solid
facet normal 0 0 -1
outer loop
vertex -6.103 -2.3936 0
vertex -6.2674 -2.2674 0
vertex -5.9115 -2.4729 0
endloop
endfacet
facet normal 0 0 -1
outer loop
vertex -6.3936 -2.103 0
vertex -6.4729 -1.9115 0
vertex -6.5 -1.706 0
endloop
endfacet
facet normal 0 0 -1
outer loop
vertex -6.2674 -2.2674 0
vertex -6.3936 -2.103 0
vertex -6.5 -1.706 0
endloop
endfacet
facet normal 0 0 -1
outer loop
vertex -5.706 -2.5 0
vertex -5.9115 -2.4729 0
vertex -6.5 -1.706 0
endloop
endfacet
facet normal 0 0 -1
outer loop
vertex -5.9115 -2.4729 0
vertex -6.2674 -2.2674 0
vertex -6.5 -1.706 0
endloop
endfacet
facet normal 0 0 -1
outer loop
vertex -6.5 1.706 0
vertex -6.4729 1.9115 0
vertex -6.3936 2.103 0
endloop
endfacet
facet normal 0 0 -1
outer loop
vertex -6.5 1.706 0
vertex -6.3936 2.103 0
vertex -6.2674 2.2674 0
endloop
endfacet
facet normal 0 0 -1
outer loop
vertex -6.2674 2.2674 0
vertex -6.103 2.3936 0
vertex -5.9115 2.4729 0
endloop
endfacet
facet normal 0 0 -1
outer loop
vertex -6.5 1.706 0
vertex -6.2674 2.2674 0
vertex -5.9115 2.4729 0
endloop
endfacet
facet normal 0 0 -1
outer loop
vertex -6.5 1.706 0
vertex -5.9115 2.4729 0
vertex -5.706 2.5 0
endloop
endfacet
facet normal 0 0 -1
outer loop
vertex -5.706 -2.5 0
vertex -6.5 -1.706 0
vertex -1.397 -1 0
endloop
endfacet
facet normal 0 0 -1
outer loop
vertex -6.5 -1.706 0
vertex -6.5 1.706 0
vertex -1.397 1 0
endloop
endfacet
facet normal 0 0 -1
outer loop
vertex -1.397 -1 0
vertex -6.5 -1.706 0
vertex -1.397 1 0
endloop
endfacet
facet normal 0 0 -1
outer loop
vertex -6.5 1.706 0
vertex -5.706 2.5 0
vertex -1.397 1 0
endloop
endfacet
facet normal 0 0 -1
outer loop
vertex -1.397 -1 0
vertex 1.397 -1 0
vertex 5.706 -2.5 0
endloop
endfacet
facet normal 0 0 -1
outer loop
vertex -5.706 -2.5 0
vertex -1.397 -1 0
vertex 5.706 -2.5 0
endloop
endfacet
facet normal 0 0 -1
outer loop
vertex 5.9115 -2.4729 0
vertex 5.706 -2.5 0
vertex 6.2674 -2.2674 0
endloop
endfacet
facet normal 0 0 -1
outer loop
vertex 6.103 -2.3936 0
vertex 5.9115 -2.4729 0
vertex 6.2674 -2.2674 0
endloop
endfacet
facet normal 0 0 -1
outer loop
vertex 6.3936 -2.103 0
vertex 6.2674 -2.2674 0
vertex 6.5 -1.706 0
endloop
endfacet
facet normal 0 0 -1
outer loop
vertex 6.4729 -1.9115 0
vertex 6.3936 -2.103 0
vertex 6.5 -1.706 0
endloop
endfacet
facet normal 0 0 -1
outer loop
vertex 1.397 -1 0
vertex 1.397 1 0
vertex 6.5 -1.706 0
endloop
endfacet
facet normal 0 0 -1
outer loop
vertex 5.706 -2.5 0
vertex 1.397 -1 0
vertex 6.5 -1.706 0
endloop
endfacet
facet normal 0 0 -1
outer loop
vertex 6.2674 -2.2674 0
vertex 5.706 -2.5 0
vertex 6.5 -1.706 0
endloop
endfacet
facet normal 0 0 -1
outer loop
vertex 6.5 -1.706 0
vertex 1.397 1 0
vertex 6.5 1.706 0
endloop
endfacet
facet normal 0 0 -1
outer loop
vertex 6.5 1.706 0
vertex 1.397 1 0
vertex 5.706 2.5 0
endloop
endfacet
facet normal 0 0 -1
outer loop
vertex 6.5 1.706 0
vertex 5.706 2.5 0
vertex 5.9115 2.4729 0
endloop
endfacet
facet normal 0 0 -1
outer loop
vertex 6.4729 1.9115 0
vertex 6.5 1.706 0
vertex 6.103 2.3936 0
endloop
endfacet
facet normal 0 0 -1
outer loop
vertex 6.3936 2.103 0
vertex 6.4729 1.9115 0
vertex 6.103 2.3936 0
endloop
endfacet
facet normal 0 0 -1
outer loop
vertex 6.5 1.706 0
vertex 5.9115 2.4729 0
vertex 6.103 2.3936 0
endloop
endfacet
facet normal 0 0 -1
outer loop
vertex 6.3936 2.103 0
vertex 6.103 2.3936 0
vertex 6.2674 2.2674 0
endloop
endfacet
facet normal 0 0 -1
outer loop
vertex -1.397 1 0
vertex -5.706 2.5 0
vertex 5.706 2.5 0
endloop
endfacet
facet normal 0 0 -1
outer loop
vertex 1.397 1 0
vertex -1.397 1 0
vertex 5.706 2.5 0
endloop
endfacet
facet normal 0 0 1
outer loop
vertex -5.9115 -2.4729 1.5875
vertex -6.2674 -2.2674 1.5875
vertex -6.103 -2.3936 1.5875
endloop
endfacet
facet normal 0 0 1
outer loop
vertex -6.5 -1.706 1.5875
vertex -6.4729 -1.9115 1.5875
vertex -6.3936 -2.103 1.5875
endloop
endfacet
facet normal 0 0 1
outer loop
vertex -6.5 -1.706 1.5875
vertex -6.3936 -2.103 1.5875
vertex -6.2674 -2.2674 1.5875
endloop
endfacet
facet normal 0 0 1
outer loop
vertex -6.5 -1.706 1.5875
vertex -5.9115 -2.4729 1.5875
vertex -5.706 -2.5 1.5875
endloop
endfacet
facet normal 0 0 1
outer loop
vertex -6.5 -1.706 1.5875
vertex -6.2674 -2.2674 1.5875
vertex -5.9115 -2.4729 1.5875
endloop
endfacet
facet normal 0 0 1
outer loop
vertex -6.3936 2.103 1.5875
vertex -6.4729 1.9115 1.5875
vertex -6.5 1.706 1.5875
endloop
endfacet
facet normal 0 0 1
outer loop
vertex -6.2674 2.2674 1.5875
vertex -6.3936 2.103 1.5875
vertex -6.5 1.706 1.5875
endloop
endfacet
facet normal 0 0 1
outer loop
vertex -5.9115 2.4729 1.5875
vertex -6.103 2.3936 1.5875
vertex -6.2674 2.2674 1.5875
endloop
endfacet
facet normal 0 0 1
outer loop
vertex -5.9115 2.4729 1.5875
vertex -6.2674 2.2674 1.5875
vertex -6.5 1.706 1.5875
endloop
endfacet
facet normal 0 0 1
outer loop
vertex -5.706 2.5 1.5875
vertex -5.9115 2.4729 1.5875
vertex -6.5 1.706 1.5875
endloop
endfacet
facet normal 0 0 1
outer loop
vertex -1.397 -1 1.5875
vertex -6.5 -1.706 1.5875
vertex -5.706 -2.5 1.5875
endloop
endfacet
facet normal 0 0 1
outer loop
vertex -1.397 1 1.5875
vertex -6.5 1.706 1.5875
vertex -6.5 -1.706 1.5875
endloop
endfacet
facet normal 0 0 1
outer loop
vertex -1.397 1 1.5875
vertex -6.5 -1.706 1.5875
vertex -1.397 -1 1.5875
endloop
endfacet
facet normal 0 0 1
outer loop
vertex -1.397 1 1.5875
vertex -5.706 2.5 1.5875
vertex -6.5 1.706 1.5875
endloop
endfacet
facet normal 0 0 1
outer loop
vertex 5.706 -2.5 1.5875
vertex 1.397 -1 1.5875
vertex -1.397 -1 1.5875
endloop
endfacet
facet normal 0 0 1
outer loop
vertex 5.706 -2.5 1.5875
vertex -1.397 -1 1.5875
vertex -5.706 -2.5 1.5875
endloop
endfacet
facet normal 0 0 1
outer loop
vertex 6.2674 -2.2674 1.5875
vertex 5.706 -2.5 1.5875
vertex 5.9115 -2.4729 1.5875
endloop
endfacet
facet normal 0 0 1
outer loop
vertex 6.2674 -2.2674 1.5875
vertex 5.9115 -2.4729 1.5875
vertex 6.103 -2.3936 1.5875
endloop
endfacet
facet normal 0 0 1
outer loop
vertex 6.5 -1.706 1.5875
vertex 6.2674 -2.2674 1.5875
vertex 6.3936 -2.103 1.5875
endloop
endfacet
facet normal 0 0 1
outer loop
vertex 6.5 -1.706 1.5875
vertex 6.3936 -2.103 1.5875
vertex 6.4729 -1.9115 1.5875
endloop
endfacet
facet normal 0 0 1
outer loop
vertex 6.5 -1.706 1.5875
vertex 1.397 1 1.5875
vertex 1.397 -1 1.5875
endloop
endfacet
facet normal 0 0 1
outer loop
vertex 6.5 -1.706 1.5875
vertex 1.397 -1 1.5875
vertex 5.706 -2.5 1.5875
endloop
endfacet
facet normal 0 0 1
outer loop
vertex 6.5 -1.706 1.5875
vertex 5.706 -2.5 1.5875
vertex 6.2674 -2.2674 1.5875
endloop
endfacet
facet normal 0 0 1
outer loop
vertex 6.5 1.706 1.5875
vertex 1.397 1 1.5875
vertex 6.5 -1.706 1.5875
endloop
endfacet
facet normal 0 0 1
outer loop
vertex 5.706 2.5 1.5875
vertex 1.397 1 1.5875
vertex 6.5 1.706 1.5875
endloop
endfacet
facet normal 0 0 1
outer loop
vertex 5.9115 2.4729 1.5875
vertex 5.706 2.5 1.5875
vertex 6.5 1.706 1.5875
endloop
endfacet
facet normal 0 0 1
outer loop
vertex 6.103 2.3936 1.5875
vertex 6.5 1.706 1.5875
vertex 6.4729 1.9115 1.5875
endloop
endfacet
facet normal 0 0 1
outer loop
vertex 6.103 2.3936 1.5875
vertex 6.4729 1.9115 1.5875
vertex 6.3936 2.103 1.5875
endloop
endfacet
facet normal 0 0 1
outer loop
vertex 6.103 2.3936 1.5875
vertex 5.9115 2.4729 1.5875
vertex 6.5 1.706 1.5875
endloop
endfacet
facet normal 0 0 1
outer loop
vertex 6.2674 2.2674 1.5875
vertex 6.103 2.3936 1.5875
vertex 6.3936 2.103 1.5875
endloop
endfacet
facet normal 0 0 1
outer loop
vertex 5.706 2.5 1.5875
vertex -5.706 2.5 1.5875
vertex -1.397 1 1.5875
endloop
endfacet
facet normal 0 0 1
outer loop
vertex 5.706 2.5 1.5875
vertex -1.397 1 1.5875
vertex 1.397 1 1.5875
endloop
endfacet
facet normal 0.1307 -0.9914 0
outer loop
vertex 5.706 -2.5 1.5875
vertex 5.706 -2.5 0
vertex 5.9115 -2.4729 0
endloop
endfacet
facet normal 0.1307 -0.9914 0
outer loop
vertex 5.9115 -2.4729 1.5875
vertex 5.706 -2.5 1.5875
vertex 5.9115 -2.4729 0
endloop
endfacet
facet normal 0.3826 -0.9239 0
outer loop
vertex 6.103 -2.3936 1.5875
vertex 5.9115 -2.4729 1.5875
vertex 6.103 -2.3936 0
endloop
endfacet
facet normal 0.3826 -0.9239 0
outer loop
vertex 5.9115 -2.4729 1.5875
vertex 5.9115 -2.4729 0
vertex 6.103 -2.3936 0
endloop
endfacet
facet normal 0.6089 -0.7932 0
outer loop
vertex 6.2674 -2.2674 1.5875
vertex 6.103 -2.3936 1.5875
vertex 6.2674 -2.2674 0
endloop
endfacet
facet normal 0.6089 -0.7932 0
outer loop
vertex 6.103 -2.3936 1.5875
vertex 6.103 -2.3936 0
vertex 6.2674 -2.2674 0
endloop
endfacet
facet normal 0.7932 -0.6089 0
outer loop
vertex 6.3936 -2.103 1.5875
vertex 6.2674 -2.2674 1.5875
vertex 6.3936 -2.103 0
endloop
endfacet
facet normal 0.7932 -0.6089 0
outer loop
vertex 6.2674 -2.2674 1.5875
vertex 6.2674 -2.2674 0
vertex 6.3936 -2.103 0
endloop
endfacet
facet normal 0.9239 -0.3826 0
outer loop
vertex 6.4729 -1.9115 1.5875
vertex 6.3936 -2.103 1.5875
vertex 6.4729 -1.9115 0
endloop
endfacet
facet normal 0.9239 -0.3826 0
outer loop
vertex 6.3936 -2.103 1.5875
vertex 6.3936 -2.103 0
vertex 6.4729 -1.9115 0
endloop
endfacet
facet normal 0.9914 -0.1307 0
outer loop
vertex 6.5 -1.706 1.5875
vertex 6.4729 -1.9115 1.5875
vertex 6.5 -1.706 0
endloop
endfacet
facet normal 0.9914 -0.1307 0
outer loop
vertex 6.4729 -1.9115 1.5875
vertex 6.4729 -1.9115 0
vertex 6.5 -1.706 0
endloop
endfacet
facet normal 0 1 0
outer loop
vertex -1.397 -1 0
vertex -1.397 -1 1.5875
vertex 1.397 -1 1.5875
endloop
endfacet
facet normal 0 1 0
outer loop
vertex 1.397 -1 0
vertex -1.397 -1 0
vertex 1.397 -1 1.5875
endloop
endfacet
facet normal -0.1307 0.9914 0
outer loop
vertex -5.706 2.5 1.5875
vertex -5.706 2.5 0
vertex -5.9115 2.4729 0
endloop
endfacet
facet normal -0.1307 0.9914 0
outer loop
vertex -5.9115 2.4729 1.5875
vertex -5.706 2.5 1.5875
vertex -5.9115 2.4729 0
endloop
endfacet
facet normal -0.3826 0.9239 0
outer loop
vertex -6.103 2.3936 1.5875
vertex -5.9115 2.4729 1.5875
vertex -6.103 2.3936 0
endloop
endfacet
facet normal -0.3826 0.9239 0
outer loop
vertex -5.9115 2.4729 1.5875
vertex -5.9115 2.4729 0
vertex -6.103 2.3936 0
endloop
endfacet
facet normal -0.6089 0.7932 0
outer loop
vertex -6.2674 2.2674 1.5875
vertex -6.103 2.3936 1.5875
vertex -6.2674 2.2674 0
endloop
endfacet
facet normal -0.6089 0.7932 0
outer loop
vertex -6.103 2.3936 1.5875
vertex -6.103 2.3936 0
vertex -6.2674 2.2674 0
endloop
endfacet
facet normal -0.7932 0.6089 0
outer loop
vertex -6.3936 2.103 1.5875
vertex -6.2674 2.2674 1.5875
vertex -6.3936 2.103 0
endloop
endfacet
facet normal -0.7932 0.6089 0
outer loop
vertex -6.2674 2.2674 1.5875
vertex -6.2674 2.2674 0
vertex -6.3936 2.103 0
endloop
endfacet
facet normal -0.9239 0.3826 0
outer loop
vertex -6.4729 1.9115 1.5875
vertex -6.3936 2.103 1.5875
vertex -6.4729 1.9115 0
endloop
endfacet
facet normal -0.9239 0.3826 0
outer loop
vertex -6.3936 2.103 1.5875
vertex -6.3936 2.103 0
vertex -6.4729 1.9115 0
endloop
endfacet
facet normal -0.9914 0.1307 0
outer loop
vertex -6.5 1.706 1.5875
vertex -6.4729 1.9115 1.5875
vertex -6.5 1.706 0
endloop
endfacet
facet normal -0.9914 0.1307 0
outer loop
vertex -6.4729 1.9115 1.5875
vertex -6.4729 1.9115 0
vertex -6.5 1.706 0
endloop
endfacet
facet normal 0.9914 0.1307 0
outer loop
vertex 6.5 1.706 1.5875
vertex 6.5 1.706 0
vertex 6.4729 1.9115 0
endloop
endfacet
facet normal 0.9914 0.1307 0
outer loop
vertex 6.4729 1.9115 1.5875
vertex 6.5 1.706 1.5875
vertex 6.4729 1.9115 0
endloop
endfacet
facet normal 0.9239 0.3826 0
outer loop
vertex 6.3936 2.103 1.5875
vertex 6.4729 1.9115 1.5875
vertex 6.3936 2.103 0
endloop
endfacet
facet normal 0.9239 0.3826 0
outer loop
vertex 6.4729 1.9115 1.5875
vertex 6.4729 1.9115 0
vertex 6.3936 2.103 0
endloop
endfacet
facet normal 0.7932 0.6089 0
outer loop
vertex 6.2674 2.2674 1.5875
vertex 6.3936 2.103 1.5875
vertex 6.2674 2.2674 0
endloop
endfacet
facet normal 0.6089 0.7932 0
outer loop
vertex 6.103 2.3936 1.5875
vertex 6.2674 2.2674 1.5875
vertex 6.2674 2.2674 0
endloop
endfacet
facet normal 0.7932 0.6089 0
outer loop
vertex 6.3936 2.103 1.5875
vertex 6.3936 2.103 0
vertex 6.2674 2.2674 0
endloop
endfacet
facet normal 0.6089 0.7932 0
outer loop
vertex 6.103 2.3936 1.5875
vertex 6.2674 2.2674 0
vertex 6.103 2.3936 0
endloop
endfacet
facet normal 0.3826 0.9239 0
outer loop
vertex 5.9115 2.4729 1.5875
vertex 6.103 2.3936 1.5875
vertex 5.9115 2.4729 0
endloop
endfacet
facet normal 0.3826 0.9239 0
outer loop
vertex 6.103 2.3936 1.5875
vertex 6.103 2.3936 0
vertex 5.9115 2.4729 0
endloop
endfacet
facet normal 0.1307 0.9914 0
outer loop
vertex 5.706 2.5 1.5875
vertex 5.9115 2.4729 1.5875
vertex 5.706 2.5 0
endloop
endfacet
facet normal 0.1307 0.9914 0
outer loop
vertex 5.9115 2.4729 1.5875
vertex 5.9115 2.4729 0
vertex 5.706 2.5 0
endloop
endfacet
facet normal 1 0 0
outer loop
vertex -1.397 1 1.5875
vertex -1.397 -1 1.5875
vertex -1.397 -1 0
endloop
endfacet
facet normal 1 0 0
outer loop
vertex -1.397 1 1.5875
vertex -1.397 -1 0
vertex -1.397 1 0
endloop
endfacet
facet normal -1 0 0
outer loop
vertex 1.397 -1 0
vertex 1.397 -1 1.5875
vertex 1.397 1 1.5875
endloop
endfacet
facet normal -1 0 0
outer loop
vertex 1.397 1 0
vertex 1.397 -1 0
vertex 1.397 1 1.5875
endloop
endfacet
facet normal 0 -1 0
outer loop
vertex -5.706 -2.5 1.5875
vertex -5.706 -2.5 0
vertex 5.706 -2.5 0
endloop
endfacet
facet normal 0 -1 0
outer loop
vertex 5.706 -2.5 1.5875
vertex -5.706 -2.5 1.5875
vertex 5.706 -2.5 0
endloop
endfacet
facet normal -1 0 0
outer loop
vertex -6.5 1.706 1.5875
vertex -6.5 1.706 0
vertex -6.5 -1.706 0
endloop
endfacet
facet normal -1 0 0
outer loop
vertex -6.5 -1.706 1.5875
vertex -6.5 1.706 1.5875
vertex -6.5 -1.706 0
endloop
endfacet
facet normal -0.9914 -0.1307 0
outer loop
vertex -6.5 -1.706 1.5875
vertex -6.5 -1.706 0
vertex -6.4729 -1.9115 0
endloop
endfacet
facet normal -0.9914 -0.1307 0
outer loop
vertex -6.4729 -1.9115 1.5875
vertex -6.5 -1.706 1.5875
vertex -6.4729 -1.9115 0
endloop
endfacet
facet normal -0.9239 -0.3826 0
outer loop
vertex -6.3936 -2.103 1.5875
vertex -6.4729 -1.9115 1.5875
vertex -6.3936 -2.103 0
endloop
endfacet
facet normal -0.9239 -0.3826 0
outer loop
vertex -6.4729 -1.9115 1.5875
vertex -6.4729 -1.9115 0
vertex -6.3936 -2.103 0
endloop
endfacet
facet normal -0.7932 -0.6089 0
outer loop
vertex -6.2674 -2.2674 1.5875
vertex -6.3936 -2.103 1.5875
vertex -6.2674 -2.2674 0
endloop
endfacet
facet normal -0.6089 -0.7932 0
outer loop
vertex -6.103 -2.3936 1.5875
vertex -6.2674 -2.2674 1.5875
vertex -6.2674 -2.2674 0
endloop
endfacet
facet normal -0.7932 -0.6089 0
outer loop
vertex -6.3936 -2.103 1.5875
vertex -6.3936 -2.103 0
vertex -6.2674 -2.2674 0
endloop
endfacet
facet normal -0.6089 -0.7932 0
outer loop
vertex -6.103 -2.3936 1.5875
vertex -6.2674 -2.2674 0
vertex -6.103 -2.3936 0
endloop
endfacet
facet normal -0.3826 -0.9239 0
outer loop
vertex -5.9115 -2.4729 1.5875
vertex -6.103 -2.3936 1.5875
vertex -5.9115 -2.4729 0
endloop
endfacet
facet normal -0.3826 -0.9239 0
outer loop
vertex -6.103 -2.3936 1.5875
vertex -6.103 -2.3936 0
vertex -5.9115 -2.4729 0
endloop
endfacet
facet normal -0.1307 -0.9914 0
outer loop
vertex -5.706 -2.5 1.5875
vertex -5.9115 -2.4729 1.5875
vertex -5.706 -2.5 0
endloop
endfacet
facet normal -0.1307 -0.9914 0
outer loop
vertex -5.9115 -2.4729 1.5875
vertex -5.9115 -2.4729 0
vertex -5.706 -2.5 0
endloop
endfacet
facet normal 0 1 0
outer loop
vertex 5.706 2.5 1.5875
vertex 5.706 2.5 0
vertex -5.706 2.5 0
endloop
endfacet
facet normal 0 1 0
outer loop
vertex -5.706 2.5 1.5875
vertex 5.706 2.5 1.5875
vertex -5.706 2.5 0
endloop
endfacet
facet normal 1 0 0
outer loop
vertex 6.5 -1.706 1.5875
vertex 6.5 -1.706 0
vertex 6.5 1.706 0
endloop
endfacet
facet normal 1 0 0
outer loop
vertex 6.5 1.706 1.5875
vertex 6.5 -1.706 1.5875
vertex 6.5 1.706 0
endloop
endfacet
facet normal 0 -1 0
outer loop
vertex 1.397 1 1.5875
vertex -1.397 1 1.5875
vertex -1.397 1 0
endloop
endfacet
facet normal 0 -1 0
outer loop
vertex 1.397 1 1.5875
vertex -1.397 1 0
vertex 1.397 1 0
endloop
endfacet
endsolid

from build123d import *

# Parameters (mm, degrees)
BOSS_EXTRUDE1_DEPTH = 1.5875
SKETCH2_W           = 2.794
SKETCH2_H           = 2
CUT_EXTRUDE1_DEPTH  = 8.142839509


with BuildPart() as part:
    # Sketch1 → Boss-Extrude1 (new body)
    with BuildSketch(Plane.XY):
        with BuildLine():
            Line((-5.706, -2.5), (5.706, -2.5))
            ThreePointArc((5.706, -2.5), (6.267442784, -2.267442784), (6.5, -1.706))
            Line((6.5, -1.706), (6.5, 1.706))
            ThreePointArc((6.5, 1.706), (6.267442784, 2.267442784), (5.706, 2.5))
            Line((5.706, 2.5), (-5.706, 2.5))
            ThreePointArc((-5.706, 2.5), (-6.267442784, 2.267442784), (-6.5, 1.706))
            Line((-6.5, 1.706), (-6.5, -1.706))
            ThreePointArc((-6.5, -1.706), (-6.267442784, -2.267442784), (-5.706, -2.5))
        make_face()
    extrude(amount=BOSS_EXTRUDE1_DEPTH)

    # Sketch2 → Cut-Extrude1 (cut, through all)
    with BuildSketch(Plane.XY.offset(1.5875)):
        Rectangle(SKETCH2_W, SKETCH2_H)
    extrude(amount=-CUT_EXTRUDE1_DEPTH, mode=Mode.SUBTRACT)


solid = part.part
